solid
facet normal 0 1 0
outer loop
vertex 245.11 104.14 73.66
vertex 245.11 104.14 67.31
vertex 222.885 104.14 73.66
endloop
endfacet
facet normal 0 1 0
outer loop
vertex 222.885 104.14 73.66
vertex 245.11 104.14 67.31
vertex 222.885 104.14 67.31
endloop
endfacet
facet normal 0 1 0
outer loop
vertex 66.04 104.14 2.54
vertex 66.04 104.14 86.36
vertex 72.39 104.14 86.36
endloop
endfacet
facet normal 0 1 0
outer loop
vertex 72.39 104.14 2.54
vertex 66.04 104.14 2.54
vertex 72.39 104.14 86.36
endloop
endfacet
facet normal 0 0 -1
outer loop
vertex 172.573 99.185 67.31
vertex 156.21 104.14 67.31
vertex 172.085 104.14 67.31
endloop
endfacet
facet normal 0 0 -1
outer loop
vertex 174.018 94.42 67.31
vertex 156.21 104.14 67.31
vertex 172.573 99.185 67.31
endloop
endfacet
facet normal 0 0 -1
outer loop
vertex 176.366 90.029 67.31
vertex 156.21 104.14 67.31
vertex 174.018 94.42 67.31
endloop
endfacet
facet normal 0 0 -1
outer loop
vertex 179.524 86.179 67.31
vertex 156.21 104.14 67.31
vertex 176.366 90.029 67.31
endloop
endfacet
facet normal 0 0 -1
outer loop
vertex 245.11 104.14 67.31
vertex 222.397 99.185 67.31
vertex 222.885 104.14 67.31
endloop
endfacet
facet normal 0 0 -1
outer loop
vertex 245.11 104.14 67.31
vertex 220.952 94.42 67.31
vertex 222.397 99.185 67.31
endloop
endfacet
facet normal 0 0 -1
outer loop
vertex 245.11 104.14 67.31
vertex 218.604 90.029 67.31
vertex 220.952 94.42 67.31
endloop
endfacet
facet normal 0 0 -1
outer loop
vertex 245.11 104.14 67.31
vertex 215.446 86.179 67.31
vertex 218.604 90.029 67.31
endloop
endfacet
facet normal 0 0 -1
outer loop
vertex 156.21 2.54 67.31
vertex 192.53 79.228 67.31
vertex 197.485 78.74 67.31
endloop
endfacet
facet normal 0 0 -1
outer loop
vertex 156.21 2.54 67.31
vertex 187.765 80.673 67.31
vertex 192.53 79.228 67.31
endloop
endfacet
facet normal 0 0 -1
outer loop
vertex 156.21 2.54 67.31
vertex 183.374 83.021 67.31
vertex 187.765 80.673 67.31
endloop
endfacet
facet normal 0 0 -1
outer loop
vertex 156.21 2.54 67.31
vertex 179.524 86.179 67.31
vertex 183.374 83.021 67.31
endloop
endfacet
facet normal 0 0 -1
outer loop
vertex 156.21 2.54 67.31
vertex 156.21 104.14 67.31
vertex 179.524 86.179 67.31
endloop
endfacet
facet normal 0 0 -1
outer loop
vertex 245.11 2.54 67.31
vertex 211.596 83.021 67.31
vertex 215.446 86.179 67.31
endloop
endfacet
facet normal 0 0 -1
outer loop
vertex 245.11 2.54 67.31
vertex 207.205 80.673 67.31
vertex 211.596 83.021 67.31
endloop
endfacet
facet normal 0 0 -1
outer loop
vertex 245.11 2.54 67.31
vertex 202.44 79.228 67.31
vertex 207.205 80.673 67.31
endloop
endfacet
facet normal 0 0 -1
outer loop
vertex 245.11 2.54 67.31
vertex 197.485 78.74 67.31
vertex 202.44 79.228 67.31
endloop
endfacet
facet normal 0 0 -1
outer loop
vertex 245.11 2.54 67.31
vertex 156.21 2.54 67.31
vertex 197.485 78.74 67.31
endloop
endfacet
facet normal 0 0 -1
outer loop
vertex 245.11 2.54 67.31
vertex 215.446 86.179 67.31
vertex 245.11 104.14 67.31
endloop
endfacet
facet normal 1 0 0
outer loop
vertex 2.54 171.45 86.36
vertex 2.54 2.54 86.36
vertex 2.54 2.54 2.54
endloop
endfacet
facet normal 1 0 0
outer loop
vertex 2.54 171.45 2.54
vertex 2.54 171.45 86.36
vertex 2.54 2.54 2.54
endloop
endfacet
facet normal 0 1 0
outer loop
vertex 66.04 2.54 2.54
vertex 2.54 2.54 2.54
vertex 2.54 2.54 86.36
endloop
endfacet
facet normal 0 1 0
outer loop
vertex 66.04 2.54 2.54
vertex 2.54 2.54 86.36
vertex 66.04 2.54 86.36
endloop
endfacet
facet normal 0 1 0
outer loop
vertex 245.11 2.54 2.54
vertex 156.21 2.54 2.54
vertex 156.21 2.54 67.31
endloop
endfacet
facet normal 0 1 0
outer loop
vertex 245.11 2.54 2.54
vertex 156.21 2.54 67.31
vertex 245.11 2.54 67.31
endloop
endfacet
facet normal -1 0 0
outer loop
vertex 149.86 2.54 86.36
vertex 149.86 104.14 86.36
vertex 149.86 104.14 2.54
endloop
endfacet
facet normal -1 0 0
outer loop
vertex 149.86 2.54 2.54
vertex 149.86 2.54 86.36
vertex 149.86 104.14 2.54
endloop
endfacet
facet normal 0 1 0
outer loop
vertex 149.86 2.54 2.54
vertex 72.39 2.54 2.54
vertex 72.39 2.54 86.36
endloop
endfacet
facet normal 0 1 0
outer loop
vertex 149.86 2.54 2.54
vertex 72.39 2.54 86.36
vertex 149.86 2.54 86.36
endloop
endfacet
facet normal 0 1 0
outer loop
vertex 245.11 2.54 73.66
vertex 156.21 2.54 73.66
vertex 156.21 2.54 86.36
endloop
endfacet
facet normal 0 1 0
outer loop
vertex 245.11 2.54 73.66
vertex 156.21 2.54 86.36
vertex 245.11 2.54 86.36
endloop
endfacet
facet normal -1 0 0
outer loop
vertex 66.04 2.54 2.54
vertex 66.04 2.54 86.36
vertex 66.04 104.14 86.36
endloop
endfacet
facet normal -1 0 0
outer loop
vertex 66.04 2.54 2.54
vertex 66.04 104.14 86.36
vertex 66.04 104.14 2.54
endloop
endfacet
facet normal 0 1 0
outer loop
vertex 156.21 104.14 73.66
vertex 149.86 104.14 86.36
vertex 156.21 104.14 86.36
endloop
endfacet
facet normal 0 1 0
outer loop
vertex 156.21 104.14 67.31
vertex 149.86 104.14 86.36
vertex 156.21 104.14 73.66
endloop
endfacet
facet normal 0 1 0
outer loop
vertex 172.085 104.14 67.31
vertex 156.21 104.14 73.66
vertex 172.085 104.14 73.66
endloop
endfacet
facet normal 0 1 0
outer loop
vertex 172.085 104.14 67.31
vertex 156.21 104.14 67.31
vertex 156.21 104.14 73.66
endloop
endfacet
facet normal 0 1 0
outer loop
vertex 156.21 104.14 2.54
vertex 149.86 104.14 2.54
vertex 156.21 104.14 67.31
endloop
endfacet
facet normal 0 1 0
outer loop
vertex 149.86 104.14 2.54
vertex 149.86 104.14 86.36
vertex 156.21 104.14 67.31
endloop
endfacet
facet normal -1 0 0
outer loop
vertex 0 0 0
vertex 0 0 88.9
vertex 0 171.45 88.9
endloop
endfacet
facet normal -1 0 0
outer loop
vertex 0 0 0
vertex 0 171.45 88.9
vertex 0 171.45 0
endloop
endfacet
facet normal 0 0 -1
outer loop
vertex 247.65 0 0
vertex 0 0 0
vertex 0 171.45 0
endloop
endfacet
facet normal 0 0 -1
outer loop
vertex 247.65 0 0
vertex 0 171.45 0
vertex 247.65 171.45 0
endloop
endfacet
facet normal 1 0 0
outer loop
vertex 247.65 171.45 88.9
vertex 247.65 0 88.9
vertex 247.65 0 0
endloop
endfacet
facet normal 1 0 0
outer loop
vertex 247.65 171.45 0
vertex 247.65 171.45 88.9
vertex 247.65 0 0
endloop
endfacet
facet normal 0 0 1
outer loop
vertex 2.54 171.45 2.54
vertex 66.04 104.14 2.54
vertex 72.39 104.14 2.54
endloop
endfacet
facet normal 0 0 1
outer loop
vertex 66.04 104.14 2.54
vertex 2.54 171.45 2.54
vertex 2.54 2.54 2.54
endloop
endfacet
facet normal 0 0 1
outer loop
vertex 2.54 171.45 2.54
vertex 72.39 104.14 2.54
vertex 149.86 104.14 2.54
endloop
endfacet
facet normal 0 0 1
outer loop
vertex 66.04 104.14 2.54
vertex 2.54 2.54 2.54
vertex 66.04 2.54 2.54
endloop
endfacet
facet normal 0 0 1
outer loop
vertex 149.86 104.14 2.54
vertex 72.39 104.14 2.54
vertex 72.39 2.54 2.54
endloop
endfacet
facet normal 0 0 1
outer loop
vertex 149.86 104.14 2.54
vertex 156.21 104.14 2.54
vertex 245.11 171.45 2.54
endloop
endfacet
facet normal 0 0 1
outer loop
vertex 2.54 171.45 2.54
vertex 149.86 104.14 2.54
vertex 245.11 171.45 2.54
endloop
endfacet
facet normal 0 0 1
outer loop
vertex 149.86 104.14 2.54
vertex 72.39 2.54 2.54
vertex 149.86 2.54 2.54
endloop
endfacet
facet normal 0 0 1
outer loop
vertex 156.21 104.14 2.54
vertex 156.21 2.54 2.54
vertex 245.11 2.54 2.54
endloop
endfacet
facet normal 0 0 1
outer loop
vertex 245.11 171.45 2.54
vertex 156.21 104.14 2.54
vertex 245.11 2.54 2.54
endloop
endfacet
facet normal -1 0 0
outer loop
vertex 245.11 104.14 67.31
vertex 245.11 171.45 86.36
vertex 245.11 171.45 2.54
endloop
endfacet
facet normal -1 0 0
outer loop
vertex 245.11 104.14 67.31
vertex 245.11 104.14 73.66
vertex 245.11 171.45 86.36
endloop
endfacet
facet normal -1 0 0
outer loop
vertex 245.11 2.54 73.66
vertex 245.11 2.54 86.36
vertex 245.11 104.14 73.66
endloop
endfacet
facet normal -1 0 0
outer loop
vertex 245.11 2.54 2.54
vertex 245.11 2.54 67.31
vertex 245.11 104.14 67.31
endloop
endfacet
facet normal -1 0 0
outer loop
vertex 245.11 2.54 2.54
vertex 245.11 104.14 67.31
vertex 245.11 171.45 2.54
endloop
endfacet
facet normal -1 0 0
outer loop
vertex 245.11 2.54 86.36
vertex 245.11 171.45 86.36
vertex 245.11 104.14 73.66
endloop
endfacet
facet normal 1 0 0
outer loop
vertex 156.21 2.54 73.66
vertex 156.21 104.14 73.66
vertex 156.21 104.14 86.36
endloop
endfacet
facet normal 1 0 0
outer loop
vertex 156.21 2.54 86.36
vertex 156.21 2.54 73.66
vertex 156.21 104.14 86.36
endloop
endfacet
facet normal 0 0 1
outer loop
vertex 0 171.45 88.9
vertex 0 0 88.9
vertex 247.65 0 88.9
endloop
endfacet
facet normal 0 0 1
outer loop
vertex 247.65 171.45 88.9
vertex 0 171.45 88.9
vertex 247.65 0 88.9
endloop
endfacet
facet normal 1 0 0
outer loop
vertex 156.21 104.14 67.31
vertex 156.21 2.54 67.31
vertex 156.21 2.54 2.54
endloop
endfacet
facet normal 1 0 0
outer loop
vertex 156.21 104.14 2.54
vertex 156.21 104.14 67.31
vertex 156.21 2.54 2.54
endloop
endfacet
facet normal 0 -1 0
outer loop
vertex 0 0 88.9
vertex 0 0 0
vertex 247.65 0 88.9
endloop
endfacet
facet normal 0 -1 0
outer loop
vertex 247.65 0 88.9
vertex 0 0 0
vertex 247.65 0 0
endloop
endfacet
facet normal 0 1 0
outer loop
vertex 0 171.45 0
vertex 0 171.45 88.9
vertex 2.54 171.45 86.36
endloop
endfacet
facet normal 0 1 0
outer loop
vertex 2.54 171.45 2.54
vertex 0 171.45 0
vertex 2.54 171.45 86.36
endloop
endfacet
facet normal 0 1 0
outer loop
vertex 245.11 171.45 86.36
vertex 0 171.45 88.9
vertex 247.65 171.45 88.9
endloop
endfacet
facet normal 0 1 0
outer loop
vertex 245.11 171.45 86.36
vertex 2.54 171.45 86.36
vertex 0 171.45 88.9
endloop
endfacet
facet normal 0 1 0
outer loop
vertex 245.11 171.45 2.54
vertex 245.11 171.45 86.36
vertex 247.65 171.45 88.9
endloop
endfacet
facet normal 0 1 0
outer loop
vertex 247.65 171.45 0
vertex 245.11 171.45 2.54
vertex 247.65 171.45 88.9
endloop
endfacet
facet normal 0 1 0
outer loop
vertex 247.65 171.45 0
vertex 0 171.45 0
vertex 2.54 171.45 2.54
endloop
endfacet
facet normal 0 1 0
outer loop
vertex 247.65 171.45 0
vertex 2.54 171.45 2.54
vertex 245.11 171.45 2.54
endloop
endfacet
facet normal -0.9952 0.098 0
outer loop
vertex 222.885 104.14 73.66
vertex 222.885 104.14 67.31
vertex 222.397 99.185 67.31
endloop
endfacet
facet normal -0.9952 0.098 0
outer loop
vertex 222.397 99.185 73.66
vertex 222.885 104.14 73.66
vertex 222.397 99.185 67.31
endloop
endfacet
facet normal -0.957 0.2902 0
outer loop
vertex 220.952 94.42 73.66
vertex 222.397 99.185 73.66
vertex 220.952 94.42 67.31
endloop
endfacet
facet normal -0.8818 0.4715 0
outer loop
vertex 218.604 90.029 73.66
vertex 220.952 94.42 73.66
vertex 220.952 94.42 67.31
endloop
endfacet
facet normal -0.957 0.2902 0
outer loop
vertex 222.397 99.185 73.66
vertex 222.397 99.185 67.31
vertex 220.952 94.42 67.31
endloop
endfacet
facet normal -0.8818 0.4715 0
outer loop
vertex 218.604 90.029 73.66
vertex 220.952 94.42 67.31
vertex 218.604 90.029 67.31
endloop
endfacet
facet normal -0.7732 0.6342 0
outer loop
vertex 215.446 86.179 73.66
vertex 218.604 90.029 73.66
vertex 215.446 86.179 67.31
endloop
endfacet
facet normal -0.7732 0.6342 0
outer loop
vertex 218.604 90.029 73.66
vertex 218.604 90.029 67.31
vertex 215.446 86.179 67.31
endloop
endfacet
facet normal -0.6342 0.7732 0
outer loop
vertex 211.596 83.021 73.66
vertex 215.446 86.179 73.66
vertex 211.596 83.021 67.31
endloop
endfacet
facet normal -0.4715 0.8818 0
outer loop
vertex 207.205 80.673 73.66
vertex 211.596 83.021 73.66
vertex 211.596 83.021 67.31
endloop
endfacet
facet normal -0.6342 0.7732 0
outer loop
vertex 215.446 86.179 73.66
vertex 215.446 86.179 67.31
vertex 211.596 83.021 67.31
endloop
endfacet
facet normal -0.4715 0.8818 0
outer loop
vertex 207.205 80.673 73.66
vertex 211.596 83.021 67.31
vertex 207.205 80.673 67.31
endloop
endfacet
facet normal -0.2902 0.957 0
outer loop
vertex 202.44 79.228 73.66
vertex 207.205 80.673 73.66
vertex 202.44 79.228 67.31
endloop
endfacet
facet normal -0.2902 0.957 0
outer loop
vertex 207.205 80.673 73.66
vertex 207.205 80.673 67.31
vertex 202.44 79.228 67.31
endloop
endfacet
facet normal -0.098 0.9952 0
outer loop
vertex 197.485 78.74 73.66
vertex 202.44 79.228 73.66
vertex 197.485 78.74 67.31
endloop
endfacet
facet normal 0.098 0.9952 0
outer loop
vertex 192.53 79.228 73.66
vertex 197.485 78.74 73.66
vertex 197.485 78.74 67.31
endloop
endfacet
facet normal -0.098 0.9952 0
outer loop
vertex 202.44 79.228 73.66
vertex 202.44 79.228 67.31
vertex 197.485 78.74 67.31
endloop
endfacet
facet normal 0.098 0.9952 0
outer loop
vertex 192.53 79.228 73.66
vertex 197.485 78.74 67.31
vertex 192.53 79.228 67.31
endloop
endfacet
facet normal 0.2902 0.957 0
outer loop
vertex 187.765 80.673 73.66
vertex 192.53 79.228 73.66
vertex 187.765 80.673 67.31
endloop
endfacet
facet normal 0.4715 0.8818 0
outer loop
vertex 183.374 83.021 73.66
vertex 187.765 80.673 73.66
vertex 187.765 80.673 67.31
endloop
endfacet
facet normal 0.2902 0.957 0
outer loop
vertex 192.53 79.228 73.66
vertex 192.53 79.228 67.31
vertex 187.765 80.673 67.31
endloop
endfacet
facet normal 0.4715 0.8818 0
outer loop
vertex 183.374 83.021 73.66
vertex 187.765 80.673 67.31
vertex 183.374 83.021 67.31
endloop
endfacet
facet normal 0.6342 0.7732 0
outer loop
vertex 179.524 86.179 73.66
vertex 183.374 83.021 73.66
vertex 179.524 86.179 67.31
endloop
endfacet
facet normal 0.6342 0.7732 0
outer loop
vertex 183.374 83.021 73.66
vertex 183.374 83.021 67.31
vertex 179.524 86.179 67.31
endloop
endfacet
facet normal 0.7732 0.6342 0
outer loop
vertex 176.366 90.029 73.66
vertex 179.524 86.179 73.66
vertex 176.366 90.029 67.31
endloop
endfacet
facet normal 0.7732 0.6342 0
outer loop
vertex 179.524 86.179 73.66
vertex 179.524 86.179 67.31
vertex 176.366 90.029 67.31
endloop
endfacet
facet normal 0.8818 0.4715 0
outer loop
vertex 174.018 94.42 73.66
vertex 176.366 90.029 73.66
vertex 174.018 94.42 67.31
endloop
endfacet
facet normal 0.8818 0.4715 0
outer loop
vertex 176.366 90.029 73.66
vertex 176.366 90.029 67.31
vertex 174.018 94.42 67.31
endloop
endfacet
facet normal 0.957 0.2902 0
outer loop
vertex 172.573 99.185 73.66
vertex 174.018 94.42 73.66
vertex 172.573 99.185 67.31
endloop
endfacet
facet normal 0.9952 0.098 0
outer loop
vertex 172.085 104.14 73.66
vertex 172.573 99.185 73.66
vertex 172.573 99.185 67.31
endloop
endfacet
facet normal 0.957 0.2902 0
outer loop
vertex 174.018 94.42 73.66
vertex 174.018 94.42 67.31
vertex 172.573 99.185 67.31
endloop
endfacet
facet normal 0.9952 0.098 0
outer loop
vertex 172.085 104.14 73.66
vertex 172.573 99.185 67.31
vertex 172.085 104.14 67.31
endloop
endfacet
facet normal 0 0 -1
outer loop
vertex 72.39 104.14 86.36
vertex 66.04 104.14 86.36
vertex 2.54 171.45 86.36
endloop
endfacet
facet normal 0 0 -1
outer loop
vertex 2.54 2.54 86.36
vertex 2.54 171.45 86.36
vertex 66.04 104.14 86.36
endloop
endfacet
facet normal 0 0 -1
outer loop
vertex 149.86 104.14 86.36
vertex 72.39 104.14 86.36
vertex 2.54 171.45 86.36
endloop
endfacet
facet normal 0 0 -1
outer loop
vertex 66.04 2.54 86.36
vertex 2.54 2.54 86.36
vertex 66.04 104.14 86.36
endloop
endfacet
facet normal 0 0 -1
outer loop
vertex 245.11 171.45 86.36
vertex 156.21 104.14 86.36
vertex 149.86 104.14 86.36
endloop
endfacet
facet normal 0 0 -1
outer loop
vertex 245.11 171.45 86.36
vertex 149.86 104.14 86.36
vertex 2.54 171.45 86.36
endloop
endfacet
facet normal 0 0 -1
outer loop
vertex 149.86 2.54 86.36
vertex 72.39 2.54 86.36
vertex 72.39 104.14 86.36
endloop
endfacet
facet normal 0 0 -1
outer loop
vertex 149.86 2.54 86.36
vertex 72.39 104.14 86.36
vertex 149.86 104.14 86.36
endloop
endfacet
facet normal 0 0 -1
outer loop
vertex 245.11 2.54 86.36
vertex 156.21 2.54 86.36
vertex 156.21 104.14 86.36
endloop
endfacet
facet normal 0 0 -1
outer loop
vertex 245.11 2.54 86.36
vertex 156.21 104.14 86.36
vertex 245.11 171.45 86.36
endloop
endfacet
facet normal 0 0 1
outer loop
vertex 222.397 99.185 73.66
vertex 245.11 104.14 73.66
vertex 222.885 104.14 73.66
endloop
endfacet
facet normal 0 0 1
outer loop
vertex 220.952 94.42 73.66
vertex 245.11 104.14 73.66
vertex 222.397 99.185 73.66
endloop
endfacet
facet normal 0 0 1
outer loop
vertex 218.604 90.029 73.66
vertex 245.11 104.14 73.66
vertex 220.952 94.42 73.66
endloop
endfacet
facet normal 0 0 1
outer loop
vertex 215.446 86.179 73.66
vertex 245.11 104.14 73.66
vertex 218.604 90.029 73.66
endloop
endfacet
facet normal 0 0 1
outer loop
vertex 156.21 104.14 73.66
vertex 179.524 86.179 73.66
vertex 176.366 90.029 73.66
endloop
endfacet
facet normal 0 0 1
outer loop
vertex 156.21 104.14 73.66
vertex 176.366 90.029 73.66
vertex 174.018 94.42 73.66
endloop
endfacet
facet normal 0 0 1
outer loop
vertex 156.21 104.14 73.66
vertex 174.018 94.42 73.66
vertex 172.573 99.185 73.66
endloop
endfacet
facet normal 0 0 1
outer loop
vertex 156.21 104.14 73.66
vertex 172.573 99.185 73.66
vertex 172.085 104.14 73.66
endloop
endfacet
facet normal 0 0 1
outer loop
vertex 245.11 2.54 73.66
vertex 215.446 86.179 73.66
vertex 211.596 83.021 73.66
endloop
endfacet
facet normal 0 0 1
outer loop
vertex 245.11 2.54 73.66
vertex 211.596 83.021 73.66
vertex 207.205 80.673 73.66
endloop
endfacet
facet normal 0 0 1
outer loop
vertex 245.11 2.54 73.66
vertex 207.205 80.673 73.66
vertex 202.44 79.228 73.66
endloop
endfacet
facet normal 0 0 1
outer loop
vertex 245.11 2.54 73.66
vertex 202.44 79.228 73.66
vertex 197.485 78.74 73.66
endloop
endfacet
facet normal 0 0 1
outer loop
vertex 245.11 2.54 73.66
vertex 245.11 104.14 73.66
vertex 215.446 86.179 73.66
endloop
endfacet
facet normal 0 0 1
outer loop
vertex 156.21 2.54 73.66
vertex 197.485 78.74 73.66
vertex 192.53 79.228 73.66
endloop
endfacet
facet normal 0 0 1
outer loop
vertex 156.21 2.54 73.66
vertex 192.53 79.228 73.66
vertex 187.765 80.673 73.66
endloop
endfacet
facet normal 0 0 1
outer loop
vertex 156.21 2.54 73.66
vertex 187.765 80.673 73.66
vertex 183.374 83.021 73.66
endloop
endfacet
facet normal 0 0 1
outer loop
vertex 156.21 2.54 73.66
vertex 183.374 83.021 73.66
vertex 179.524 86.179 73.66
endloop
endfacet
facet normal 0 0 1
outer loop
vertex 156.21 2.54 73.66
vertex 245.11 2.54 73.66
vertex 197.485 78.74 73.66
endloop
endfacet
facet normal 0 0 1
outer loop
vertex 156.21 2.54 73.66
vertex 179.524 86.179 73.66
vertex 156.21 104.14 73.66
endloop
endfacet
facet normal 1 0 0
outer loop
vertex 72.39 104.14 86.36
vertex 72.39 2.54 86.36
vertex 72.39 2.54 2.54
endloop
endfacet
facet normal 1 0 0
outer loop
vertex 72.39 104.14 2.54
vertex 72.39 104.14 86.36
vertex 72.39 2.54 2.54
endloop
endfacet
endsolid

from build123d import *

# Parameters (mm, degrees)
SKETCH1_W           = 247.65
SKETCH1_H           = 88.9
BOSS_EXTRUDE1_DEPTH = 171.45
SHELL1_T            = -2.54
BOSS_EXTRUDE2_DEPTH = 101.6
CUT_EXTRUDE1_REACH  = 23.59
SKETCH4_R           = 25.4
SKETCH5_W           = 6.35
SKETCH5_H           = 64.77
SKETCH5_H_2         = 83.82
BOSS_EXTRUDE3_DEPTH = 101.6


with BuildPart() as part:
    # Sketch1 → Boss-Extrude1 (new body)
    with BuildSketch(Plane(origin=(0, 0, 0), x_dir=(1, 0, 0), z_dir=(0, 1, 0))):
        with Locations((123.825, -44.45)):
            Rectangle(SKETCH1_W, SKETCH1_H)
    extrude(amount=BOSS_EXTRUDE1_DEPTH)

    # Shell1
    shell1_openings = [part.faces().sort_by_distance(p)[0] for p in [
        (123.825, 171.45, 44.45),
    ]]
    offset(amount=SHELL1_T, openings=shell1_openings, kind=Kind.INTERSECTION)

    # Sketch2 → Boss-Extrude2 (add)
    with BuildSketch(Plane(origin=(0, 2.54, 0), x_dir=(1, 0, 0), z_dir=(0, 1, 0))):
        Polygon((245.11, -73.66), (156.21, -73.66), (156.21, -86.36), (149.86, -86.36), (149.86, -67.31), (245.11, -67.31), align=None)
    extrude(amount=BOSS_EXTRUDE2_DEPTH)

    # Sketch4 → Cut-Extrude1 (cut, up to next)
    with BuildSketch(Plane(origin=(0, 0, 67.31), x_dir=(-1, 0, 0), z_dir=(0, 0, -1)), mode=Mode.PRIVATE) as cut_extrude1_sk1:
        with Locations((-197.485, 104.14)):
            Circle(SKETCH4_R)
    cut_extrude1_tool1 = extrude(cut_extrude1_sk1.sketch, amount=-CUT_EXTRUDE1_REACH, mode=Mode.PRIVATE) & part.part
    add(cut_extrude1_tool1.solids().sort_by_distance((197.485, 104.14, 67.31))[0], mode=Mode.SUBTRACT)

    # Sketch5 → Boss-Extrude3 (add)
    with BuildSketch(Plane(origin=(0, 2.54, 0), x_dir=(1, 0, 0), z_dir=(0, 1, 0))):
        with Locations((153.035, -34.925)):
            Rectangle(SKETCH5_W, SKETCH5_H)
        with Locations((69.215, -44.45)):
            Rectangle(SKETCH5_W, SKETCH5_H_2)
    extrude(amount=BOSS_EXTRUDE3_DEPTH)


solid = part.part
